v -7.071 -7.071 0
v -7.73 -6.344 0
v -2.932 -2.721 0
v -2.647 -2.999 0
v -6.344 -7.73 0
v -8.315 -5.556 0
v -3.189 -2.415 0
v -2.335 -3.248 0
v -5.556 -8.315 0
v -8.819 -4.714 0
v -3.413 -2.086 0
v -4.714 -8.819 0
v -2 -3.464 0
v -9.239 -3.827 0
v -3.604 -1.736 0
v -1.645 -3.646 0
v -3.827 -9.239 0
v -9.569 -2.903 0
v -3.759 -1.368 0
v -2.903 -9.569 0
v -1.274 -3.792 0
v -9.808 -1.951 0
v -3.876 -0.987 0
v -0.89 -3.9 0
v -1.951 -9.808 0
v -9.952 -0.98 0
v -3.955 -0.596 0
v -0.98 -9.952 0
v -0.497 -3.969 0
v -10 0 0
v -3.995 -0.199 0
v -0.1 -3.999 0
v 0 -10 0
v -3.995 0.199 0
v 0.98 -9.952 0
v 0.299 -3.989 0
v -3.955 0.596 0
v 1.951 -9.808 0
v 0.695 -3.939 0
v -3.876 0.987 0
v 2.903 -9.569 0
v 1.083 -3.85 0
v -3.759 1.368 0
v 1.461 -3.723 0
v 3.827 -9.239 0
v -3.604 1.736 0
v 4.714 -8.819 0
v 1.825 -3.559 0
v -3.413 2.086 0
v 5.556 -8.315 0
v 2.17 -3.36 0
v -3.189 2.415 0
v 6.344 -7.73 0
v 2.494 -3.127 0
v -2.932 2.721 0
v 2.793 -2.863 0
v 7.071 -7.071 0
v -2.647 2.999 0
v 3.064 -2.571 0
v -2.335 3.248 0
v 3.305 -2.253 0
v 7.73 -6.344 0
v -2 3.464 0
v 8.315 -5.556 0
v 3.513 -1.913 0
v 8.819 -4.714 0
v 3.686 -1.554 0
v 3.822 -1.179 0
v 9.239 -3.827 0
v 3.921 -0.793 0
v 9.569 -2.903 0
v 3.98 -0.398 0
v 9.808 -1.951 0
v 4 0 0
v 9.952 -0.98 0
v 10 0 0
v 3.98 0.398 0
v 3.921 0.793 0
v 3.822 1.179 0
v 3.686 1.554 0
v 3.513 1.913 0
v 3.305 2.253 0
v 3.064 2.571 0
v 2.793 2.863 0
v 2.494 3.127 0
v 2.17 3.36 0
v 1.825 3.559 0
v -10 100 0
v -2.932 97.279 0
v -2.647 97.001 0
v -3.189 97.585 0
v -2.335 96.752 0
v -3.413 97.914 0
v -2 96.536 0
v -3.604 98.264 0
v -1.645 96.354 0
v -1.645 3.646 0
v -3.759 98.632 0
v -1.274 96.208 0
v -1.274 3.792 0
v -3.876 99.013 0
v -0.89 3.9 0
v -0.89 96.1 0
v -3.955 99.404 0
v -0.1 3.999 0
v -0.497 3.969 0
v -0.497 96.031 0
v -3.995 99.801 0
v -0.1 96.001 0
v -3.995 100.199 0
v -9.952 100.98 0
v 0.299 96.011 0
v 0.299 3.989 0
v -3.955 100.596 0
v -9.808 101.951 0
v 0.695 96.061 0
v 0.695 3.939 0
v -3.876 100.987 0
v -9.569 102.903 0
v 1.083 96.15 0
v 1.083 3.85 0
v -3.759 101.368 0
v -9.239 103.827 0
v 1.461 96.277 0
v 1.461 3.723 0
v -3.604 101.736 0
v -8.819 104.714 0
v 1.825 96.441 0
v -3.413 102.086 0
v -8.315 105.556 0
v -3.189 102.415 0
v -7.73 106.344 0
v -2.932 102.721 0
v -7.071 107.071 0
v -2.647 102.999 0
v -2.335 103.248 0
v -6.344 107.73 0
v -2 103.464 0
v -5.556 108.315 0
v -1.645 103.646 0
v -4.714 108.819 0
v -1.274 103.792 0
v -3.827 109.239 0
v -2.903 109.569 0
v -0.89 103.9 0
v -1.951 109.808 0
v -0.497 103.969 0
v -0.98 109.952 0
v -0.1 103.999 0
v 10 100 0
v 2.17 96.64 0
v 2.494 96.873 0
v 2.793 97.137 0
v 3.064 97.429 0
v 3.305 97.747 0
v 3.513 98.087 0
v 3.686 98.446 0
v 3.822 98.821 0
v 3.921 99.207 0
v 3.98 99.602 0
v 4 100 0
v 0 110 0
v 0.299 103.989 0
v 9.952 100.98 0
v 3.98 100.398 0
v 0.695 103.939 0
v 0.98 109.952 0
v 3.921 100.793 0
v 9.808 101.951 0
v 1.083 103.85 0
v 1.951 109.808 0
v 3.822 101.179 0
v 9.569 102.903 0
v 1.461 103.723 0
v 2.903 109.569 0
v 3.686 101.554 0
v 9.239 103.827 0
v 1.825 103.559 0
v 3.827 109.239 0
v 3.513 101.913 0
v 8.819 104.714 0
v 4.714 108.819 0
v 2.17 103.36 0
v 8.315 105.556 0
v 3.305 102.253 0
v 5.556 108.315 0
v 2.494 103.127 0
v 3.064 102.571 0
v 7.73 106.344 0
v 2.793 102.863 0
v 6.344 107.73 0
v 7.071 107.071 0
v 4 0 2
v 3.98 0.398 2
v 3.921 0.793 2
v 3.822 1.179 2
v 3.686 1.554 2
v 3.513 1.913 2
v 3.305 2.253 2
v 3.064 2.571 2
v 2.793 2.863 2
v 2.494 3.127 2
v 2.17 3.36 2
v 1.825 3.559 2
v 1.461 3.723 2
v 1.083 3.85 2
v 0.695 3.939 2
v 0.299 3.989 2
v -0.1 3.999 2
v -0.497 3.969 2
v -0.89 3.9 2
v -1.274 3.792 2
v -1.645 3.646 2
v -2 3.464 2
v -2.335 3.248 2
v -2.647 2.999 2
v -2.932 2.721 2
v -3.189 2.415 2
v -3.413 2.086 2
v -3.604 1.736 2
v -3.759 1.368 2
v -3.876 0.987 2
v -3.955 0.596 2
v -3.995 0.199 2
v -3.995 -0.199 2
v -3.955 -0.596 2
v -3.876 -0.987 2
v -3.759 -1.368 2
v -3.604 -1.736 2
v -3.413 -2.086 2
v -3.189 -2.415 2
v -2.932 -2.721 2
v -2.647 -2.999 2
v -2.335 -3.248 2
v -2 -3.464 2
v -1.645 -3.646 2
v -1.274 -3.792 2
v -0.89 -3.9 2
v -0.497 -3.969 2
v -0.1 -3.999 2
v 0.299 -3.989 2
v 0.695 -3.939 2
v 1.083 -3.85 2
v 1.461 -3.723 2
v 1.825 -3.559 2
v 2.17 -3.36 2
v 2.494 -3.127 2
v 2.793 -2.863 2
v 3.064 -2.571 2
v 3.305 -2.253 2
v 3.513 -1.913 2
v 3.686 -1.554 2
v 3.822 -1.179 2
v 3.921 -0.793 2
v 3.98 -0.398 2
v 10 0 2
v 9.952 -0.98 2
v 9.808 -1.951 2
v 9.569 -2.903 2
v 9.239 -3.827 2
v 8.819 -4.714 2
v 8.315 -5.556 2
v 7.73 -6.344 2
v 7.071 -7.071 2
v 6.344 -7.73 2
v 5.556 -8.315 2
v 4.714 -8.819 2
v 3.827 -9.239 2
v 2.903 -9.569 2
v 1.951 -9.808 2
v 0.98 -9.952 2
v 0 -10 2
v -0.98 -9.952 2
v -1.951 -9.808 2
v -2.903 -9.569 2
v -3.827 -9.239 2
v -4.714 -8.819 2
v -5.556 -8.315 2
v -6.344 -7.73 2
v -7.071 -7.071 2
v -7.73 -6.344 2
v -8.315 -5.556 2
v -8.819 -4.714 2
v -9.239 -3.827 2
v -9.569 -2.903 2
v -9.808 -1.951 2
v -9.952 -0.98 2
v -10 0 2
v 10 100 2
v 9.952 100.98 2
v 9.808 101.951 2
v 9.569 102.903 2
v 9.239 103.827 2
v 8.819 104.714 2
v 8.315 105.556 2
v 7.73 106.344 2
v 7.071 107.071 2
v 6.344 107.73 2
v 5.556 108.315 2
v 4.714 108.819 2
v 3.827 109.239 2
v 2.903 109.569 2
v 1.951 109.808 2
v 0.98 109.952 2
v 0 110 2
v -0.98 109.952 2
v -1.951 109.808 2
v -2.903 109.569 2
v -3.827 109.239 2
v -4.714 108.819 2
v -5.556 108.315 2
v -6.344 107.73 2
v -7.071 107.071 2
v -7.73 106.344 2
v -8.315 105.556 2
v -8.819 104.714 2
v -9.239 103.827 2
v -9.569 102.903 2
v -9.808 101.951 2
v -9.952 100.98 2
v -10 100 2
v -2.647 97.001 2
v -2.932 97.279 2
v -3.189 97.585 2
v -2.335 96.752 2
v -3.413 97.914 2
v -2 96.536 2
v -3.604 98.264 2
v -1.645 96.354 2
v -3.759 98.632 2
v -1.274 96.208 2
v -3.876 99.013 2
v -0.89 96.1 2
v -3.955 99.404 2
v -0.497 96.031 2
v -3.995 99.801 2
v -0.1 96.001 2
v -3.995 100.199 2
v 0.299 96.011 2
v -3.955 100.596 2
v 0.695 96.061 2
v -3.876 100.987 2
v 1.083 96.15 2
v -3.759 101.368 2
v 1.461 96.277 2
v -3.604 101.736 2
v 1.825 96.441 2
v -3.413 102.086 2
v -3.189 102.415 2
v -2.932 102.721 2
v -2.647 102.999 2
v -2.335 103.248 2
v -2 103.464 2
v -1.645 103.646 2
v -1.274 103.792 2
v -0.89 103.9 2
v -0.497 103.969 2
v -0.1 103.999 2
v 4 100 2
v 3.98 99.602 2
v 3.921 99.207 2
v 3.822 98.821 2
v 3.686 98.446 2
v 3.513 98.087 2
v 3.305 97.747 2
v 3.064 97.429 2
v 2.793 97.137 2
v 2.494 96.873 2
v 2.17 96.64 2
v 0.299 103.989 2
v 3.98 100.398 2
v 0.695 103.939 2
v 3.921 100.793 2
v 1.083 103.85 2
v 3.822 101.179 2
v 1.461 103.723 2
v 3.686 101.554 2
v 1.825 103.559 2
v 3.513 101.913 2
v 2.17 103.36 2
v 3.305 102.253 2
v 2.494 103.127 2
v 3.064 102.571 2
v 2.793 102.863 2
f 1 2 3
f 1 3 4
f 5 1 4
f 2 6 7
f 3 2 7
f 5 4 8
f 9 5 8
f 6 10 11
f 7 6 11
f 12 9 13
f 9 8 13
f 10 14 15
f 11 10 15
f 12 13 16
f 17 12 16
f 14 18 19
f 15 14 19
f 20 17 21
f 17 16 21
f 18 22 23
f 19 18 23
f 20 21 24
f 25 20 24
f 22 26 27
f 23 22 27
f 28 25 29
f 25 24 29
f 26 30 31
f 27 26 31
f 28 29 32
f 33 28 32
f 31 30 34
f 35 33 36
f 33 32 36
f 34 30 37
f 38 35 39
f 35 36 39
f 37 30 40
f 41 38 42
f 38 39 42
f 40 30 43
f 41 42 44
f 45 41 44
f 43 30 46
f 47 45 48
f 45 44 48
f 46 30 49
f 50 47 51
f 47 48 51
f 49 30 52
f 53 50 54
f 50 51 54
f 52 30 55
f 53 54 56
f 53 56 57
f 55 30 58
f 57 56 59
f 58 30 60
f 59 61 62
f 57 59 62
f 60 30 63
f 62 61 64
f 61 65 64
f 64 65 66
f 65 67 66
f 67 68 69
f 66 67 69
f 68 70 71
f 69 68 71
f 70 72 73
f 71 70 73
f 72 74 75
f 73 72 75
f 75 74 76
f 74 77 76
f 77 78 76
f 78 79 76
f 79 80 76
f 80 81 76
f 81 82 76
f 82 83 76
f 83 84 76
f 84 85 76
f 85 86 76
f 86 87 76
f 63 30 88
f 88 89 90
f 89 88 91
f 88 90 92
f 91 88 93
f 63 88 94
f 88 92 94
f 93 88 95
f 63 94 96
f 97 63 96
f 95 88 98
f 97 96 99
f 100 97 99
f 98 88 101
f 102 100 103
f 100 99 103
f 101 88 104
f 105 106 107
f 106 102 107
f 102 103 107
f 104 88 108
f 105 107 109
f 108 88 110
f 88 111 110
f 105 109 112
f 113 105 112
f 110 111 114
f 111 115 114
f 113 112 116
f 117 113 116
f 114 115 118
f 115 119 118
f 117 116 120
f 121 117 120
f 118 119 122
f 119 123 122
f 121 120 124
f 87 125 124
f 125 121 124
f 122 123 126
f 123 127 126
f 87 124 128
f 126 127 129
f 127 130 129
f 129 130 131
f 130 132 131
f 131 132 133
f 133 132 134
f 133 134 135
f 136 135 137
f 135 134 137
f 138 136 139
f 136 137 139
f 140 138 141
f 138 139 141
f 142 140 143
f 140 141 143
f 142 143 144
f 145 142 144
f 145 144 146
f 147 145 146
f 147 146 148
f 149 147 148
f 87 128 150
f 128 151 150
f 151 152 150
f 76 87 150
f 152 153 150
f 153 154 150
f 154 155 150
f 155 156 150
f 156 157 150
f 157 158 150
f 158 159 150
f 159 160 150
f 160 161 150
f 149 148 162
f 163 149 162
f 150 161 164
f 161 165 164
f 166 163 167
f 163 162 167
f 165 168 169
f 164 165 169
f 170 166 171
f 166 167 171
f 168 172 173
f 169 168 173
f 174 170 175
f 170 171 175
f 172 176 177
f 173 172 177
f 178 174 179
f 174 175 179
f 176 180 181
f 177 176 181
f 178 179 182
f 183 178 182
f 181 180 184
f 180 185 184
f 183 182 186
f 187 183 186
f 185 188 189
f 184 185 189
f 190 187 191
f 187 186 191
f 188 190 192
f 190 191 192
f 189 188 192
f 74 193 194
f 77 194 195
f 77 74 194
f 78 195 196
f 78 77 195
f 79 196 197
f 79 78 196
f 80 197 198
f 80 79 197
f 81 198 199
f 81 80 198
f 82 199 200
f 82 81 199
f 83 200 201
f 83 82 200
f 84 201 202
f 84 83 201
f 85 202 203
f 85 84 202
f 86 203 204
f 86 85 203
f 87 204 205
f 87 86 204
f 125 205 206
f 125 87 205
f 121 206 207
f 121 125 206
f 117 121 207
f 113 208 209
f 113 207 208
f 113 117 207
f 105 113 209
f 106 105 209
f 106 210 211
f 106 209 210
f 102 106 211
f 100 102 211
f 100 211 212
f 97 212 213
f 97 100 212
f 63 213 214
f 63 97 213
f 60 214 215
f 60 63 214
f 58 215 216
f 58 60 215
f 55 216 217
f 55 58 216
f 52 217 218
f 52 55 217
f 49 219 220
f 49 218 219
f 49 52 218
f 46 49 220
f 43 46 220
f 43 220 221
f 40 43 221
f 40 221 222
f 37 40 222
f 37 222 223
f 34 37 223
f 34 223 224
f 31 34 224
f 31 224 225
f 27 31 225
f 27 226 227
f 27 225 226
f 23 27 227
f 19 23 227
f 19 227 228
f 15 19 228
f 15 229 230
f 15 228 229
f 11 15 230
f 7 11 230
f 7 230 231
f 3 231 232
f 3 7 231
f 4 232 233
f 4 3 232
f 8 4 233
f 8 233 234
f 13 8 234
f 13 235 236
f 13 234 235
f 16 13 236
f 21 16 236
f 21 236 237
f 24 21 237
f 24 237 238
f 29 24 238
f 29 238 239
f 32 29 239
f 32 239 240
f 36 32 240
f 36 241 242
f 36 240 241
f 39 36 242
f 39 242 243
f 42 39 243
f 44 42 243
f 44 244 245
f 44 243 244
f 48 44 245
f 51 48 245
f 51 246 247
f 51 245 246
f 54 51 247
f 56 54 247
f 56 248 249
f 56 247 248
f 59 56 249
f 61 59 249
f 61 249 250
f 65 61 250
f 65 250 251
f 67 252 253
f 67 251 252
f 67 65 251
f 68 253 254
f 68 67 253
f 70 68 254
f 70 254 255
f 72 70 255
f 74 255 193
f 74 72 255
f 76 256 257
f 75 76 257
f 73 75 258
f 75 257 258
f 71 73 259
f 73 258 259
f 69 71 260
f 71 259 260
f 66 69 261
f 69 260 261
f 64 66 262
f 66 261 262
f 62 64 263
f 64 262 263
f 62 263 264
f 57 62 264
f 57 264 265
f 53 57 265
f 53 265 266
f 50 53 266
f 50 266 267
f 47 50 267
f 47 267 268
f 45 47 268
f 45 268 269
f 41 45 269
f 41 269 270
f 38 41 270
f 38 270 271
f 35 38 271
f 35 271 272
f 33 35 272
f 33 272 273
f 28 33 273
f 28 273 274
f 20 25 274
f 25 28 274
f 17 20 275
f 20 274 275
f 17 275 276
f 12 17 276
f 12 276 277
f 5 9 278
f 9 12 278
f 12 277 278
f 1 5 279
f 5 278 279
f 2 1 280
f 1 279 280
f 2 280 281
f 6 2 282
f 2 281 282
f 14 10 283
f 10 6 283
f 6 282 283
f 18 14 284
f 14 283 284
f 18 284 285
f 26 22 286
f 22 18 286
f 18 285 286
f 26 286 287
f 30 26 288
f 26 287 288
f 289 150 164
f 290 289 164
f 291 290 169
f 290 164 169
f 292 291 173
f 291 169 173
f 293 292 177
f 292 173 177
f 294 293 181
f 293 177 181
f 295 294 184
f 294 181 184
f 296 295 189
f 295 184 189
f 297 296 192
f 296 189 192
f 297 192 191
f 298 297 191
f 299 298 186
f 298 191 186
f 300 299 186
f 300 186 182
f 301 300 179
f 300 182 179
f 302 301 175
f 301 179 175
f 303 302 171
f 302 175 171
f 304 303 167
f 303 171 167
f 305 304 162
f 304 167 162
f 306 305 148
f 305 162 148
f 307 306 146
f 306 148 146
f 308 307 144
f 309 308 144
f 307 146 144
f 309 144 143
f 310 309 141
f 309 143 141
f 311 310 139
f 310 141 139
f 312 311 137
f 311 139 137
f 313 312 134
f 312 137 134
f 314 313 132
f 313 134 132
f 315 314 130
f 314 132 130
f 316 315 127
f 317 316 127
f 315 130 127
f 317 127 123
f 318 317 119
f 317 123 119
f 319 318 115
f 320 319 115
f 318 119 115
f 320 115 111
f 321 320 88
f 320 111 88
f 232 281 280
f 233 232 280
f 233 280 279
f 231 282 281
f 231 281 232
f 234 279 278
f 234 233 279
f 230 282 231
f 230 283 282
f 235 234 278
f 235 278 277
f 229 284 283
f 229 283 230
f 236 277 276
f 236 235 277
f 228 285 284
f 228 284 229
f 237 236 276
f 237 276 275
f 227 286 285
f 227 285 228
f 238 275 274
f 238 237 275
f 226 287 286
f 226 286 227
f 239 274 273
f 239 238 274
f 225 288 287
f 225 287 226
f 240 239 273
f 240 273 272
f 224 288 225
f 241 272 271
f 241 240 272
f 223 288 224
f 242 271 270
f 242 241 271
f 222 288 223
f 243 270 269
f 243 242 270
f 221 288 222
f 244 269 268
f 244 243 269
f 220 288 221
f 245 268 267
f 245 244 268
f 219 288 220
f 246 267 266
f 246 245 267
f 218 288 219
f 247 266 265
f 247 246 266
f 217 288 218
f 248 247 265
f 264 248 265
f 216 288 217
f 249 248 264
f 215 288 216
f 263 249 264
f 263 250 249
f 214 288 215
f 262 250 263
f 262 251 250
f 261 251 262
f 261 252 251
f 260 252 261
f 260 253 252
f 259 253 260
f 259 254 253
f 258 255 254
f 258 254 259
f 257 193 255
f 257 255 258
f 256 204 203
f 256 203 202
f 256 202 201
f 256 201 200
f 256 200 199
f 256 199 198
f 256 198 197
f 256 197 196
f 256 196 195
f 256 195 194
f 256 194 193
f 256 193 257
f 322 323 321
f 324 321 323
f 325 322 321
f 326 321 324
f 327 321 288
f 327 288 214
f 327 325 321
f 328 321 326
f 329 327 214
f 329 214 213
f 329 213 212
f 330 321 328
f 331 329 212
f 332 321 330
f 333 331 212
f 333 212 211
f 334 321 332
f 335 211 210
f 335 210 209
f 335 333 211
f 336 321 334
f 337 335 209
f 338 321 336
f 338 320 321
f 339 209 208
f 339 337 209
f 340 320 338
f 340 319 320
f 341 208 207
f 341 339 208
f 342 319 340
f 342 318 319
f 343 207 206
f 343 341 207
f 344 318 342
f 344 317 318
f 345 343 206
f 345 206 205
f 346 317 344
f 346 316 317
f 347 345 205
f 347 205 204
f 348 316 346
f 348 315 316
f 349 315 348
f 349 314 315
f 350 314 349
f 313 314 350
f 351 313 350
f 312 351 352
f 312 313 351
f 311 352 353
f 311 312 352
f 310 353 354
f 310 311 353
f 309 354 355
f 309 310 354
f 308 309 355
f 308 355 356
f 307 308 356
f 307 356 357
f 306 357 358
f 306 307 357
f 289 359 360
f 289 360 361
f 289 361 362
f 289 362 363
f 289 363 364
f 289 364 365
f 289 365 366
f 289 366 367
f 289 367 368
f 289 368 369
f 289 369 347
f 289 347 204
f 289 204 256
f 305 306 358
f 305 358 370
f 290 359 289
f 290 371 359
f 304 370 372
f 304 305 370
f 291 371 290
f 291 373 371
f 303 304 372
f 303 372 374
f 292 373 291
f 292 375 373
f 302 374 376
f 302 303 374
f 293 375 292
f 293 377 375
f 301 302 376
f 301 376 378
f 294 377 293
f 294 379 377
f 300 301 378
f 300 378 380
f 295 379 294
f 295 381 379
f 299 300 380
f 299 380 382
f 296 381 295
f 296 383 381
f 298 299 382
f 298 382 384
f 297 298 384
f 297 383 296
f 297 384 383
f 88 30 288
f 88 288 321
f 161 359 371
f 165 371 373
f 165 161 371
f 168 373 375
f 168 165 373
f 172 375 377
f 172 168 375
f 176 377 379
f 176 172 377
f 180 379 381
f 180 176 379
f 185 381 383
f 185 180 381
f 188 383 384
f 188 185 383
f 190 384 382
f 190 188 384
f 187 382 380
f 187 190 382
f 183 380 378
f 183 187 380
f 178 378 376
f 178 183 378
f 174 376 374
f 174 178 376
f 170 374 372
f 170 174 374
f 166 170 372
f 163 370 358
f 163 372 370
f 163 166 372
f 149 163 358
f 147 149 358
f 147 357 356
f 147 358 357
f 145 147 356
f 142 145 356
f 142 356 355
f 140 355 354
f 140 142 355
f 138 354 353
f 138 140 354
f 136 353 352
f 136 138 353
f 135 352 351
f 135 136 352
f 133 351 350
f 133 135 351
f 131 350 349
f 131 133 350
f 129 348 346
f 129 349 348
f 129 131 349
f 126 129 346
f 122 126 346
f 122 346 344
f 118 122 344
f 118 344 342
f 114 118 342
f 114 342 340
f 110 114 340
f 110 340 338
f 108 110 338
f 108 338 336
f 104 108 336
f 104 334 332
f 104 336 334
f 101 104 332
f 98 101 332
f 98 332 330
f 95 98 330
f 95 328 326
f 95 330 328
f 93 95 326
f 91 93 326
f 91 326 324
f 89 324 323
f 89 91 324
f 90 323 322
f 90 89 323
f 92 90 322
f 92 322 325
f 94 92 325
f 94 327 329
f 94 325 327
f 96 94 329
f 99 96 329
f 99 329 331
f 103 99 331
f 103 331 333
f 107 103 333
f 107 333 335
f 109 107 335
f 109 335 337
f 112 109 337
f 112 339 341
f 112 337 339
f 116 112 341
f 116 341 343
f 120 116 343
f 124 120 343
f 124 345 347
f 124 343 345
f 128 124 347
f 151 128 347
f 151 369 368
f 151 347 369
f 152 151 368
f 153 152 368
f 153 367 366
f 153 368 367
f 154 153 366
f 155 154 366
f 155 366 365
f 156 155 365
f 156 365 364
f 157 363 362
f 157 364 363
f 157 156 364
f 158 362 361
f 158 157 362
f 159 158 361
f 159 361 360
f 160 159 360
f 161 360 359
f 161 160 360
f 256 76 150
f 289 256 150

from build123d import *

# Parameters (mm, degrees)
F0_W     = 20
F0_H     = 200
F1_DEPTH = 2
F2_R     = 4
F3_DEPTH = 12.5
F4_R     = 6
F4_R_2   = 4
F5_DEPTH = 2
F8_DEPTH = 25


with BuildPart() as f1:
    # F0 (on Top) → F1 (new body)
    with BuildSketch(Plane.XY):
        Rectangle(F0_W, F0_H)
        with BuildLine():
            Line((-10, 100), (10, 100))
            ThreePointArc((10, 100), (0, 110), (-10, 100))
        make_face()
        with BuildLine():
            ThreePointArc((-10, -100), (0, -110), (10, -100))
            Line((10, -100), (-10, -100))
        make_face()
    extrude(amount=F1_DEPTH)

    # F2 (on Top) → F3 (cut, symmetric)
    with BuildSketch(Plane.XY):
        with Locations((0, 100)):
            Circle(F2_R)
        Circle(F2_R)
        with Locations((0, -100)):
            Circle(F2_R)
    extrude(amount=F3_DEPTH, both=True, mode=Mode.SUBTRACT)

    # F7 (on face) → F8 (cut)
    with BuildSketch(Plane.XY.offset(2)):
        with BuildLine():
            ThreePointArc((10, 0), (0, -10), (-10, 0))
            Line((-10, 0), (-10, -100))
            ThreePointArc((-10, -100), (0, -110), (10, -100))
            Line((10, -100), (10, 0))
        make_face()
    extrude(amount=-F8_DEPTH, mode=Mode.SUBTRACT)


with BuildPart() as f5:
    # F4 (on face) → F5 (new body)
    with BuildSketch(Plane.XY.offset(2)):
        Circle(F4_R)
        Circle(F4_R_2, mode=Mode.SUBTRACT)
    extrude(amount=F5_DEPTH)


solid = f1.part
